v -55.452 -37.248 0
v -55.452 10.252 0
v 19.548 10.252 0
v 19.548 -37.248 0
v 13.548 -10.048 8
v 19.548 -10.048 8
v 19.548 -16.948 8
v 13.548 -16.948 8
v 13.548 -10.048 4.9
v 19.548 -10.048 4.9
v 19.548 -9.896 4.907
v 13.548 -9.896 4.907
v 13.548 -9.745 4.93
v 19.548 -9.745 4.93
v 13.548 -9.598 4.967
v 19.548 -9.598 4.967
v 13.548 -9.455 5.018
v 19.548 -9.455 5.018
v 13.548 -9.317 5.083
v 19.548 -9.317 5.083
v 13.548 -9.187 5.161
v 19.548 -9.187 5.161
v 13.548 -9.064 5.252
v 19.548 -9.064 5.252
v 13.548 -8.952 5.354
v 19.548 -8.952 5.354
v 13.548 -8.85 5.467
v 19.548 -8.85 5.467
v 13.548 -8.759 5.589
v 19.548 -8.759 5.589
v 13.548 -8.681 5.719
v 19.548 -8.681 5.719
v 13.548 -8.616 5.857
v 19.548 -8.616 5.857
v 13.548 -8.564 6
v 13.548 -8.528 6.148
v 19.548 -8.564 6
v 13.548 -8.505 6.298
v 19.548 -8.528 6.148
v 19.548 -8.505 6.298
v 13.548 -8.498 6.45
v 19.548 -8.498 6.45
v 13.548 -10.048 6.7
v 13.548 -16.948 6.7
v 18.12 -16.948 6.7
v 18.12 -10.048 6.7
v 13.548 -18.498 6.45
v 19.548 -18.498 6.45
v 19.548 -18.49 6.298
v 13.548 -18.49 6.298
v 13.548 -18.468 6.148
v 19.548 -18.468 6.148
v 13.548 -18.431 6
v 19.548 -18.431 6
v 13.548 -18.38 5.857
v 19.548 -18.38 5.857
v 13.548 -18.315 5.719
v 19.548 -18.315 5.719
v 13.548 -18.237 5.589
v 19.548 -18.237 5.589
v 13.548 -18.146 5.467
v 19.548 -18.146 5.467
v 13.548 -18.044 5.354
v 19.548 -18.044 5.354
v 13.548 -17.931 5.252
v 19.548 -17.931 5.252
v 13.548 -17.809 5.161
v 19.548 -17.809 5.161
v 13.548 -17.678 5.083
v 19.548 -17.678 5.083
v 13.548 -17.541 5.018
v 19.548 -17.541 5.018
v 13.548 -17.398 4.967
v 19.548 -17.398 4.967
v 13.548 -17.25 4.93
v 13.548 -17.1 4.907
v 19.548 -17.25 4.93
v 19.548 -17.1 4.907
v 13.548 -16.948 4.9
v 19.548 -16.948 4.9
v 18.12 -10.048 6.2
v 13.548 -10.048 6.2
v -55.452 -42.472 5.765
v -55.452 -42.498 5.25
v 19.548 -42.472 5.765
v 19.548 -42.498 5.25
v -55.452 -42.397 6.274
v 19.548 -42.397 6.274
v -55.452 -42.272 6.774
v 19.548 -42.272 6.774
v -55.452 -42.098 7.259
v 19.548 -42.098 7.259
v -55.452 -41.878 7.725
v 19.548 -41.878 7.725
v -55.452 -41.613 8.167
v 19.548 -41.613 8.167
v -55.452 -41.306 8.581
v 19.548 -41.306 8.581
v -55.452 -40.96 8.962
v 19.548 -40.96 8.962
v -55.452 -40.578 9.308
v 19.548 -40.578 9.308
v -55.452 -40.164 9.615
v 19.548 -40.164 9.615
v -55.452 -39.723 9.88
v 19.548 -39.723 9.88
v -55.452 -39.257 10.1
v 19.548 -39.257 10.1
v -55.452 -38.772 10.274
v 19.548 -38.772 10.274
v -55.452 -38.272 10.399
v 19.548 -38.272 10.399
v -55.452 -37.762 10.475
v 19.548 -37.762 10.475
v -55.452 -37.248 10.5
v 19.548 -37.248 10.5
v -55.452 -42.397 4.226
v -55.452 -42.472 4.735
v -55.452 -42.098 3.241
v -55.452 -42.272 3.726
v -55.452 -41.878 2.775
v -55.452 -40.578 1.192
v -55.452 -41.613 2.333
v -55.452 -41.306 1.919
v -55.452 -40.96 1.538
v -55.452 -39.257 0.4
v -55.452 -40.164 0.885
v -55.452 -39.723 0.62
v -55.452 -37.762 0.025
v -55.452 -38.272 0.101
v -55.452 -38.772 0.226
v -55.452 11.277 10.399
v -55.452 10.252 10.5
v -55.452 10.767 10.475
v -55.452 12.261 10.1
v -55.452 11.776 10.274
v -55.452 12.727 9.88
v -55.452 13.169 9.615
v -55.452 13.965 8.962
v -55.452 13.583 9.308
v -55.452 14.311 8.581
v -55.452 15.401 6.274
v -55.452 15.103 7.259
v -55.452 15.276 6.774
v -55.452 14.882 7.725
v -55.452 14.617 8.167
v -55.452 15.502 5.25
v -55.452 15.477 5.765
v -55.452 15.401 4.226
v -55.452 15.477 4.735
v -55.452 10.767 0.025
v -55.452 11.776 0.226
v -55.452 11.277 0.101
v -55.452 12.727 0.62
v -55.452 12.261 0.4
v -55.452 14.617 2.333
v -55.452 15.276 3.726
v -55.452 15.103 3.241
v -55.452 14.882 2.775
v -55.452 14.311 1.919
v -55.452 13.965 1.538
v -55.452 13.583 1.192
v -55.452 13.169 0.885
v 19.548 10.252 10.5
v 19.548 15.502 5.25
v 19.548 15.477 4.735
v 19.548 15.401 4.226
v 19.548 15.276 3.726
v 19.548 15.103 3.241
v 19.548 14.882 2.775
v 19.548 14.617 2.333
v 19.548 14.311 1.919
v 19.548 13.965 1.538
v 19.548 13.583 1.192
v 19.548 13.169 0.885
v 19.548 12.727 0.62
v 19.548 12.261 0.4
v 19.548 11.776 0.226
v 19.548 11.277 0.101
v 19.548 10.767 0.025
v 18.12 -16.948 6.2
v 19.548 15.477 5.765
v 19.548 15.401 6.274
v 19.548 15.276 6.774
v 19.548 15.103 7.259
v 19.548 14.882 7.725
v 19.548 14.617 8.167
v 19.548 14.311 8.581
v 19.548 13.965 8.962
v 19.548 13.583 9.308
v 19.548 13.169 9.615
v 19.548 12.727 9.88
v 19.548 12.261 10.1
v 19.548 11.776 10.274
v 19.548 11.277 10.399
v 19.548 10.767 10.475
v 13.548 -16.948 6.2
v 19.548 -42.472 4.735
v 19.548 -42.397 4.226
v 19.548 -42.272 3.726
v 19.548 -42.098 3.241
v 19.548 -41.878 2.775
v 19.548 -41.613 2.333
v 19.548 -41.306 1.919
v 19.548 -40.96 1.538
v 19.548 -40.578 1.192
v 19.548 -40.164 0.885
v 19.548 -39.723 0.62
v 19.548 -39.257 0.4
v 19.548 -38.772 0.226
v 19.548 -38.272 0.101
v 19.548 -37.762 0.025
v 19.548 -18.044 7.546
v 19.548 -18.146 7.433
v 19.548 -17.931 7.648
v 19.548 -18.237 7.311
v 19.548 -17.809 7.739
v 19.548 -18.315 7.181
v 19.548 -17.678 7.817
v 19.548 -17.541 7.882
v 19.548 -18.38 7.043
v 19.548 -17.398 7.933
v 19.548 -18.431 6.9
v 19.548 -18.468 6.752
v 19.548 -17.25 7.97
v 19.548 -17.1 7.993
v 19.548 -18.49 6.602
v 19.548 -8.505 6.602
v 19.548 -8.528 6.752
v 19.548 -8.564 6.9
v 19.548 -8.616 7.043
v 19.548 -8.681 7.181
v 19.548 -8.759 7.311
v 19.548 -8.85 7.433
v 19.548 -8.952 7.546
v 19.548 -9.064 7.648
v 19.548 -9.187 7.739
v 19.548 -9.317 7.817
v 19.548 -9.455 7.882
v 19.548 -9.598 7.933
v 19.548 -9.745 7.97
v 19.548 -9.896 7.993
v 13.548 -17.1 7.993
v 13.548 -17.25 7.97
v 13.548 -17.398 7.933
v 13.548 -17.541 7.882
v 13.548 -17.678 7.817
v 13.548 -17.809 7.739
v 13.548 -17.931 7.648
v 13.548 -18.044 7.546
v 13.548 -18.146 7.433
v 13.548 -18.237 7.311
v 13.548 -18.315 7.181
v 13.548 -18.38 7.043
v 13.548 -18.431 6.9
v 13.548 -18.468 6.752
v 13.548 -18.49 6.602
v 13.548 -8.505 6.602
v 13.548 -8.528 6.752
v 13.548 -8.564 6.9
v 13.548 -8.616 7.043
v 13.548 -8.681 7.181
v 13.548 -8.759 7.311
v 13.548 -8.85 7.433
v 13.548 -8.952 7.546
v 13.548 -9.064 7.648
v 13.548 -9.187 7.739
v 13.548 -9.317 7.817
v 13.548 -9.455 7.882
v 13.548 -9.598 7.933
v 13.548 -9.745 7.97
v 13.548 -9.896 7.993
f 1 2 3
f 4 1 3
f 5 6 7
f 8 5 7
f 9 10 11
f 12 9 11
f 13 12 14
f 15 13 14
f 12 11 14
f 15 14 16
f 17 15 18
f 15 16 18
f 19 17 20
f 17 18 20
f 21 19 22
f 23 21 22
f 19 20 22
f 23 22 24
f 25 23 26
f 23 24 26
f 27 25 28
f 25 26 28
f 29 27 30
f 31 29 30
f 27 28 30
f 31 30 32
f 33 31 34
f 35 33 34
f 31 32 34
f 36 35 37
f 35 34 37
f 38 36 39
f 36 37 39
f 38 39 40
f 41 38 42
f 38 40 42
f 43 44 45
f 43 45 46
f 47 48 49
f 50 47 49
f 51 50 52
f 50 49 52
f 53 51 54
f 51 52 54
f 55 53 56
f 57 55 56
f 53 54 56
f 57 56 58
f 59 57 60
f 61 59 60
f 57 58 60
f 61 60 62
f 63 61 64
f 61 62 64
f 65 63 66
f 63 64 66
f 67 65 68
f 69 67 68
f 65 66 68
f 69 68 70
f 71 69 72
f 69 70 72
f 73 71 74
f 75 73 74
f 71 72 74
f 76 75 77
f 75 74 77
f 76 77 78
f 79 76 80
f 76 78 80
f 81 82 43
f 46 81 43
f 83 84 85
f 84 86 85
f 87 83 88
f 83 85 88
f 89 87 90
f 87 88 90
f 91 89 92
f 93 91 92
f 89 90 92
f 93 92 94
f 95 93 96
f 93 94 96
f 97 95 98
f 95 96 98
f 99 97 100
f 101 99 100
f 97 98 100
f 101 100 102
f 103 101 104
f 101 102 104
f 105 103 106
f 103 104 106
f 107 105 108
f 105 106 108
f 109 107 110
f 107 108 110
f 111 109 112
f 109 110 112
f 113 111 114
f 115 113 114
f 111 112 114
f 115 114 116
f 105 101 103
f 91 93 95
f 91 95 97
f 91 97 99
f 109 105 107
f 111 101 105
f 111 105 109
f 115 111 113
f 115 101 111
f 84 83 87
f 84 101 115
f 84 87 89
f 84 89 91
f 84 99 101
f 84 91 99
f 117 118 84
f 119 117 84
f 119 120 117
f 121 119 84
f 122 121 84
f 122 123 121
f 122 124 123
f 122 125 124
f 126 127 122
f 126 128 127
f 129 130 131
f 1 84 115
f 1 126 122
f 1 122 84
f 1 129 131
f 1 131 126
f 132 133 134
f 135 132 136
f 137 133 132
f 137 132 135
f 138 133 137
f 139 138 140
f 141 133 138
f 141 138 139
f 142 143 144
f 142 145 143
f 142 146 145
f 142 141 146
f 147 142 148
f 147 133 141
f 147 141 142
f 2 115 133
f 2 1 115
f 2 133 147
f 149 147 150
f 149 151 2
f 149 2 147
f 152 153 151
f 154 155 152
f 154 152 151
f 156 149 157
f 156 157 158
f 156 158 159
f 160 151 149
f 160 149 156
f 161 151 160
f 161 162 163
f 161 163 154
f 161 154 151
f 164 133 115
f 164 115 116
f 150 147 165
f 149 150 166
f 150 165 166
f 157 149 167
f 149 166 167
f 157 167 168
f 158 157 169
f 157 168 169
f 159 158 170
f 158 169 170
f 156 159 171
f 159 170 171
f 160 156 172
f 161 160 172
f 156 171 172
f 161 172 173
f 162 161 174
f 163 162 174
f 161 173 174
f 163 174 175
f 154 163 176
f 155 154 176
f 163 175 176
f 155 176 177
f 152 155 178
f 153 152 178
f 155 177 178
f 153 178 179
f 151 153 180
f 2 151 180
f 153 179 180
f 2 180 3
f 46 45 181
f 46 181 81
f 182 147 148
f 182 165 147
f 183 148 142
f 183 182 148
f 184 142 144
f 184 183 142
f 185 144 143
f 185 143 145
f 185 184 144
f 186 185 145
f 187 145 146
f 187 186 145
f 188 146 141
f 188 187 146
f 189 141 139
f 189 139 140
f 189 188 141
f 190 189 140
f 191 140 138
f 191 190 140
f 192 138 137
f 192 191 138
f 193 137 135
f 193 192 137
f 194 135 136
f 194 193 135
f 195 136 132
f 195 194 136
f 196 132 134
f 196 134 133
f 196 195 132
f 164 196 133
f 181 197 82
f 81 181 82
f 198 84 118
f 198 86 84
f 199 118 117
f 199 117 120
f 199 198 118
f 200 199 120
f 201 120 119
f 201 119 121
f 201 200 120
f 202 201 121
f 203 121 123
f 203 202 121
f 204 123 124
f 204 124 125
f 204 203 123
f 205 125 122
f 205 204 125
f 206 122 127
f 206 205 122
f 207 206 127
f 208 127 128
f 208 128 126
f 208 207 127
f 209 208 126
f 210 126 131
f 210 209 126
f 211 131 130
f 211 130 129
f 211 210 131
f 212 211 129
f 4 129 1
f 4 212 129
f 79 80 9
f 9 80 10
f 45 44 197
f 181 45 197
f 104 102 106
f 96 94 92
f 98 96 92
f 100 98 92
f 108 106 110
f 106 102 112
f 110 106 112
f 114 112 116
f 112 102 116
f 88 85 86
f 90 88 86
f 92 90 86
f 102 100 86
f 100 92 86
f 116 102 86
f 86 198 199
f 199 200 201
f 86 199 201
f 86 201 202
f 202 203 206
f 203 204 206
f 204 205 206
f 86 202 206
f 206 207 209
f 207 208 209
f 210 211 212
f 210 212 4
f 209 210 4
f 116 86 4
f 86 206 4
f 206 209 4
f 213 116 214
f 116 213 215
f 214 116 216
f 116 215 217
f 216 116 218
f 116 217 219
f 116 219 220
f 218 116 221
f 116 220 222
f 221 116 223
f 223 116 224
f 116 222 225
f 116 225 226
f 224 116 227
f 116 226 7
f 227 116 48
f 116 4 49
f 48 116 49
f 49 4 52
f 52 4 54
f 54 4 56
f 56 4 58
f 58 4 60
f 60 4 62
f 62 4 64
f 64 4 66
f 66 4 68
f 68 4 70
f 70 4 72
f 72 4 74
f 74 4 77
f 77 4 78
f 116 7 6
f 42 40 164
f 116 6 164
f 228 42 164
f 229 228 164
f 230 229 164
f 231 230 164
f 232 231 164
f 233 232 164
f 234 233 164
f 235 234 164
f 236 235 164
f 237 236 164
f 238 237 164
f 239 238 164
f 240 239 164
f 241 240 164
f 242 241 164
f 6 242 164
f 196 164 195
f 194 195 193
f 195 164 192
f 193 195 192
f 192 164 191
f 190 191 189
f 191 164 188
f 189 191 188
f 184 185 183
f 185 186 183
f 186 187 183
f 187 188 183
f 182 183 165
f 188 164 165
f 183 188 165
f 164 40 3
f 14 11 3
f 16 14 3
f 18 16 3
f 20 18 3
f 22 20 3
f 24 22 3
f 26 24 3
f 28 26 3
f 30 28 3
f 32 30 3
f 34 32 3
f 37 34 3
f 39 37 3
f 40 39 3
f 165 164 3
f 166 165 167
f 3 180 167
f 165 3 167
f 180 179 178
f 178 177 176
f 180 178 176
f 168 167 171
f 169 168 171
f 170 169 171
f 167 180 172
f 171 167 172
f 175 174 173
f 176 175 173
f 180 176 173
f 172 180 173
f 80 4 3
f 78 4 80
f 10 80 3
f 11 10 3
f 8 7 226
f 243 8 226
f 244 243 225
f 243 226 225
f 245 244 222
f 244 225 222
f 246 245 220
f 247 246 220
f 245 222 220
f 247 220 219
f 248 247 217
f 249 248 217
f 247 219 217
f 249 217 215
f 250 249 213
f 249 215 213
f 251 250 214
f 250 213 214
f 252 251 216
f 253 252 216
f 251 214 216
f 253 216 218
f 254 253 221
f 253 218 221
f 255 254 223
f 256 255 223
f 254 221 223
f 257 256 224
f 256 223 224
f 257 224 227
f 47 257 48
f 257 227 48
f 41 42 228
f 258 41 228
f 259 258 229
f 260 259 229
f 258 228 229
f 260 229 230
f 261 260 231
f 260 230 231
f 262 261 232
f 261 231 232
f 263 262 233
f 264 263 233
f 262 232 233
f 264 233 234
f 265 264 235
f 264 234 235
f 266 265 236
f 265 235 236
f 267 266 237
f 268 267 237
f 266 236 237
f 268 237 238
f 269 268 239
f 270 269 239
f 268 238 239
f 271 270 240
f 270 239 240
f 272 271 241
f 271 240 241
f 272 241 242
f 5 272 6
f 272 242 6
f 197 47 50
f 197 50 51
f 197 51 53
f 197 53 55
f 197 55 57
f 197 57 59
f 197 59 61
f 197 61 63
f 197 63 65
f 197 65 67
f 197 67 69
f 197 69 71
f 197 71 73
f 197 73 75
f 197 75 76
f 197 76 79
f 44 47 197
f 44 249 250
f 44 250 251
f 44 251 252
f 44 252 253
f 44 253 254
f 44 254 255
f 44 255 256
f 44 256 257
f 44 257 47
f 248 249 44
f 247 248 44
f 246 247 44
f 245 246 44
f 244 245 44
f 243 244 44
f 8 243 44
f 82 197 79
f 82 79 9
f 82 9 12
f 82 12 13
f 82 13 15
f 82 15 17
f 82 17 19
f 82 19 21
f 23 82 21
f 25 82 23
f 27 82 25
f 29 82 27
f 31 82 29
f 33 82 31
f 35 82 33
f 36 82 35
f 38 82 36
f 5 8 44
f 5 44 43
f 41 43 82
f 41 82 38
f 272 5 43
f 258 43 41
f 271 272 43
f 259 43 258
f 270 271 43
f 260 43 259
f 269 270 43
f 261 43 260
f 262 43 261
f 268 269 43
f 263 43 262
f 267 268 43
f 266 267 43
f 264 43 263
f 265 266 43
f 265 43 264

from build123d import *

# Parameters (mm, degrees)
F0_W     = 75
F0_H     = 58
F1_DEPTH = 10.5
F3_R     = 5.24999
F4_DEPTH = 6
F5_W     = 6.9
F5_H     = 0.25
F6_DEPTH = 4.572


# Not quite as in the source:
# - a fillet or chamfer is up to 0.001 mm smaller than in the source, because OpenCascade refuses the exact size


with BuildPart() as f1:
    # F0 (on Top) → F1 (new body)
    with BuildSketch(Plane.XY):
        with Locations((-17.9516240954, -13.4977242947)):
            Rectangle(F0_W, F0_H)
    extrude(amount=F1_DEPTH)

    # F3 (radius 5.25 in the source; OpenCascade refuses exactly that, so slightly less here)
    f3_edges = [f1.edges().sort_by_distance(p)[0] for p in [
        (-17.951624, -42.497724, 10.5),
        (-17.951624, -42.497724, 0),
        (-17.951624, 15.502276, 10.5),
        (-17.951624, 15.502276, 0),
    ]]
    fillet(f3_edges, radius=F3_R)

    # F2 (on face) → F4 (cut)
    with BuildSketch(Plane.YZ.offset(19.5483759046)):
        with BuildLine():
            Line((-10.0477242947, 8), (-13.4977242947, 8))
            Line((-13.4977242947, 8), (-16.9477242947, 8))
            ThreePointArc((-16.9477242947, 8), (-15.8517087838, 7.5460155108), (-15.3977242947, 6.45))
            ThreePointArc((-15.3977242947, 6.45), (-15.8517087838, 5.3539844892), (-16.9477242947, 4.9))
            Line((-16.9477242947, 4.9), (-10.0477242947, 4.9))
            ThreePointArc((-10.0477242947, 4.9), (-11.5977242947, 6.45), (-10.0477242947, 8))
        make_face()
        with BuildLine():
            Line((-10.0477242947, 4.9), (-10.0477242947, 8))
            ThreePointArc((-10.0477242947, 8), (-11.5977242947, 6.45), (-10.0477242947, 4.9))
        make_face()
        with BuildLine():
            ThreePointArc((-8.4977242947, 6.45), (-8.9517087838, 7.5460155108), (-10.0477242947, 8))
            Line((-10.0477242947, 8), (-10.0477242947, 4.9))
            ThreePointArc((-10.0477242947, 4.9), (-8.9517087838, 5.3539844892), (-8.4977242947, 6.45))
        make_face()
        with BuildLine():
            ThreePointArc((-15.3977242947, 6.45), (-15.8517087838, 7.5460155108), (-16.9477242947, 8))
            Line((-16.9477242947, 8), (-16.9477242947, 4.9))
            ThreePointArc((-16.9477242947, 4.9), (-15.8517087838, 5.3539844892), (-15.3977242947, 6.45))
        make_face()
        with BuildLine():
            Line((-16.9477242947, 4.9), (-16.9477242947, 8))
            ThreePointArc((-16.9477242947, 8), (-18.0437398055, 7.5460155108), (-18.4977242947, 6.45))
            ThreePointArc((-18.4977242947, 6.45), (-18.0437398055, 5.3539844892), (-16.9477242947, 4.9))
        make_face()
    extrude(amount=-F4_DEPTH, mode=Mode.SUBTRACT)

    # F5 (on face) → F6 (join)
    with BuildSketch(Plane.YZ.offset(13.5483759046)):
        with Locations((-13.4977242947, 6.575)):
            Rectangle(F5_W, F5_H)
        with Locations((-13.4977242947, 6.325)):
            Rectangle(F5_W, F5_H)
    extrude(amount=F6_DEPTH)


solid = f1.part
